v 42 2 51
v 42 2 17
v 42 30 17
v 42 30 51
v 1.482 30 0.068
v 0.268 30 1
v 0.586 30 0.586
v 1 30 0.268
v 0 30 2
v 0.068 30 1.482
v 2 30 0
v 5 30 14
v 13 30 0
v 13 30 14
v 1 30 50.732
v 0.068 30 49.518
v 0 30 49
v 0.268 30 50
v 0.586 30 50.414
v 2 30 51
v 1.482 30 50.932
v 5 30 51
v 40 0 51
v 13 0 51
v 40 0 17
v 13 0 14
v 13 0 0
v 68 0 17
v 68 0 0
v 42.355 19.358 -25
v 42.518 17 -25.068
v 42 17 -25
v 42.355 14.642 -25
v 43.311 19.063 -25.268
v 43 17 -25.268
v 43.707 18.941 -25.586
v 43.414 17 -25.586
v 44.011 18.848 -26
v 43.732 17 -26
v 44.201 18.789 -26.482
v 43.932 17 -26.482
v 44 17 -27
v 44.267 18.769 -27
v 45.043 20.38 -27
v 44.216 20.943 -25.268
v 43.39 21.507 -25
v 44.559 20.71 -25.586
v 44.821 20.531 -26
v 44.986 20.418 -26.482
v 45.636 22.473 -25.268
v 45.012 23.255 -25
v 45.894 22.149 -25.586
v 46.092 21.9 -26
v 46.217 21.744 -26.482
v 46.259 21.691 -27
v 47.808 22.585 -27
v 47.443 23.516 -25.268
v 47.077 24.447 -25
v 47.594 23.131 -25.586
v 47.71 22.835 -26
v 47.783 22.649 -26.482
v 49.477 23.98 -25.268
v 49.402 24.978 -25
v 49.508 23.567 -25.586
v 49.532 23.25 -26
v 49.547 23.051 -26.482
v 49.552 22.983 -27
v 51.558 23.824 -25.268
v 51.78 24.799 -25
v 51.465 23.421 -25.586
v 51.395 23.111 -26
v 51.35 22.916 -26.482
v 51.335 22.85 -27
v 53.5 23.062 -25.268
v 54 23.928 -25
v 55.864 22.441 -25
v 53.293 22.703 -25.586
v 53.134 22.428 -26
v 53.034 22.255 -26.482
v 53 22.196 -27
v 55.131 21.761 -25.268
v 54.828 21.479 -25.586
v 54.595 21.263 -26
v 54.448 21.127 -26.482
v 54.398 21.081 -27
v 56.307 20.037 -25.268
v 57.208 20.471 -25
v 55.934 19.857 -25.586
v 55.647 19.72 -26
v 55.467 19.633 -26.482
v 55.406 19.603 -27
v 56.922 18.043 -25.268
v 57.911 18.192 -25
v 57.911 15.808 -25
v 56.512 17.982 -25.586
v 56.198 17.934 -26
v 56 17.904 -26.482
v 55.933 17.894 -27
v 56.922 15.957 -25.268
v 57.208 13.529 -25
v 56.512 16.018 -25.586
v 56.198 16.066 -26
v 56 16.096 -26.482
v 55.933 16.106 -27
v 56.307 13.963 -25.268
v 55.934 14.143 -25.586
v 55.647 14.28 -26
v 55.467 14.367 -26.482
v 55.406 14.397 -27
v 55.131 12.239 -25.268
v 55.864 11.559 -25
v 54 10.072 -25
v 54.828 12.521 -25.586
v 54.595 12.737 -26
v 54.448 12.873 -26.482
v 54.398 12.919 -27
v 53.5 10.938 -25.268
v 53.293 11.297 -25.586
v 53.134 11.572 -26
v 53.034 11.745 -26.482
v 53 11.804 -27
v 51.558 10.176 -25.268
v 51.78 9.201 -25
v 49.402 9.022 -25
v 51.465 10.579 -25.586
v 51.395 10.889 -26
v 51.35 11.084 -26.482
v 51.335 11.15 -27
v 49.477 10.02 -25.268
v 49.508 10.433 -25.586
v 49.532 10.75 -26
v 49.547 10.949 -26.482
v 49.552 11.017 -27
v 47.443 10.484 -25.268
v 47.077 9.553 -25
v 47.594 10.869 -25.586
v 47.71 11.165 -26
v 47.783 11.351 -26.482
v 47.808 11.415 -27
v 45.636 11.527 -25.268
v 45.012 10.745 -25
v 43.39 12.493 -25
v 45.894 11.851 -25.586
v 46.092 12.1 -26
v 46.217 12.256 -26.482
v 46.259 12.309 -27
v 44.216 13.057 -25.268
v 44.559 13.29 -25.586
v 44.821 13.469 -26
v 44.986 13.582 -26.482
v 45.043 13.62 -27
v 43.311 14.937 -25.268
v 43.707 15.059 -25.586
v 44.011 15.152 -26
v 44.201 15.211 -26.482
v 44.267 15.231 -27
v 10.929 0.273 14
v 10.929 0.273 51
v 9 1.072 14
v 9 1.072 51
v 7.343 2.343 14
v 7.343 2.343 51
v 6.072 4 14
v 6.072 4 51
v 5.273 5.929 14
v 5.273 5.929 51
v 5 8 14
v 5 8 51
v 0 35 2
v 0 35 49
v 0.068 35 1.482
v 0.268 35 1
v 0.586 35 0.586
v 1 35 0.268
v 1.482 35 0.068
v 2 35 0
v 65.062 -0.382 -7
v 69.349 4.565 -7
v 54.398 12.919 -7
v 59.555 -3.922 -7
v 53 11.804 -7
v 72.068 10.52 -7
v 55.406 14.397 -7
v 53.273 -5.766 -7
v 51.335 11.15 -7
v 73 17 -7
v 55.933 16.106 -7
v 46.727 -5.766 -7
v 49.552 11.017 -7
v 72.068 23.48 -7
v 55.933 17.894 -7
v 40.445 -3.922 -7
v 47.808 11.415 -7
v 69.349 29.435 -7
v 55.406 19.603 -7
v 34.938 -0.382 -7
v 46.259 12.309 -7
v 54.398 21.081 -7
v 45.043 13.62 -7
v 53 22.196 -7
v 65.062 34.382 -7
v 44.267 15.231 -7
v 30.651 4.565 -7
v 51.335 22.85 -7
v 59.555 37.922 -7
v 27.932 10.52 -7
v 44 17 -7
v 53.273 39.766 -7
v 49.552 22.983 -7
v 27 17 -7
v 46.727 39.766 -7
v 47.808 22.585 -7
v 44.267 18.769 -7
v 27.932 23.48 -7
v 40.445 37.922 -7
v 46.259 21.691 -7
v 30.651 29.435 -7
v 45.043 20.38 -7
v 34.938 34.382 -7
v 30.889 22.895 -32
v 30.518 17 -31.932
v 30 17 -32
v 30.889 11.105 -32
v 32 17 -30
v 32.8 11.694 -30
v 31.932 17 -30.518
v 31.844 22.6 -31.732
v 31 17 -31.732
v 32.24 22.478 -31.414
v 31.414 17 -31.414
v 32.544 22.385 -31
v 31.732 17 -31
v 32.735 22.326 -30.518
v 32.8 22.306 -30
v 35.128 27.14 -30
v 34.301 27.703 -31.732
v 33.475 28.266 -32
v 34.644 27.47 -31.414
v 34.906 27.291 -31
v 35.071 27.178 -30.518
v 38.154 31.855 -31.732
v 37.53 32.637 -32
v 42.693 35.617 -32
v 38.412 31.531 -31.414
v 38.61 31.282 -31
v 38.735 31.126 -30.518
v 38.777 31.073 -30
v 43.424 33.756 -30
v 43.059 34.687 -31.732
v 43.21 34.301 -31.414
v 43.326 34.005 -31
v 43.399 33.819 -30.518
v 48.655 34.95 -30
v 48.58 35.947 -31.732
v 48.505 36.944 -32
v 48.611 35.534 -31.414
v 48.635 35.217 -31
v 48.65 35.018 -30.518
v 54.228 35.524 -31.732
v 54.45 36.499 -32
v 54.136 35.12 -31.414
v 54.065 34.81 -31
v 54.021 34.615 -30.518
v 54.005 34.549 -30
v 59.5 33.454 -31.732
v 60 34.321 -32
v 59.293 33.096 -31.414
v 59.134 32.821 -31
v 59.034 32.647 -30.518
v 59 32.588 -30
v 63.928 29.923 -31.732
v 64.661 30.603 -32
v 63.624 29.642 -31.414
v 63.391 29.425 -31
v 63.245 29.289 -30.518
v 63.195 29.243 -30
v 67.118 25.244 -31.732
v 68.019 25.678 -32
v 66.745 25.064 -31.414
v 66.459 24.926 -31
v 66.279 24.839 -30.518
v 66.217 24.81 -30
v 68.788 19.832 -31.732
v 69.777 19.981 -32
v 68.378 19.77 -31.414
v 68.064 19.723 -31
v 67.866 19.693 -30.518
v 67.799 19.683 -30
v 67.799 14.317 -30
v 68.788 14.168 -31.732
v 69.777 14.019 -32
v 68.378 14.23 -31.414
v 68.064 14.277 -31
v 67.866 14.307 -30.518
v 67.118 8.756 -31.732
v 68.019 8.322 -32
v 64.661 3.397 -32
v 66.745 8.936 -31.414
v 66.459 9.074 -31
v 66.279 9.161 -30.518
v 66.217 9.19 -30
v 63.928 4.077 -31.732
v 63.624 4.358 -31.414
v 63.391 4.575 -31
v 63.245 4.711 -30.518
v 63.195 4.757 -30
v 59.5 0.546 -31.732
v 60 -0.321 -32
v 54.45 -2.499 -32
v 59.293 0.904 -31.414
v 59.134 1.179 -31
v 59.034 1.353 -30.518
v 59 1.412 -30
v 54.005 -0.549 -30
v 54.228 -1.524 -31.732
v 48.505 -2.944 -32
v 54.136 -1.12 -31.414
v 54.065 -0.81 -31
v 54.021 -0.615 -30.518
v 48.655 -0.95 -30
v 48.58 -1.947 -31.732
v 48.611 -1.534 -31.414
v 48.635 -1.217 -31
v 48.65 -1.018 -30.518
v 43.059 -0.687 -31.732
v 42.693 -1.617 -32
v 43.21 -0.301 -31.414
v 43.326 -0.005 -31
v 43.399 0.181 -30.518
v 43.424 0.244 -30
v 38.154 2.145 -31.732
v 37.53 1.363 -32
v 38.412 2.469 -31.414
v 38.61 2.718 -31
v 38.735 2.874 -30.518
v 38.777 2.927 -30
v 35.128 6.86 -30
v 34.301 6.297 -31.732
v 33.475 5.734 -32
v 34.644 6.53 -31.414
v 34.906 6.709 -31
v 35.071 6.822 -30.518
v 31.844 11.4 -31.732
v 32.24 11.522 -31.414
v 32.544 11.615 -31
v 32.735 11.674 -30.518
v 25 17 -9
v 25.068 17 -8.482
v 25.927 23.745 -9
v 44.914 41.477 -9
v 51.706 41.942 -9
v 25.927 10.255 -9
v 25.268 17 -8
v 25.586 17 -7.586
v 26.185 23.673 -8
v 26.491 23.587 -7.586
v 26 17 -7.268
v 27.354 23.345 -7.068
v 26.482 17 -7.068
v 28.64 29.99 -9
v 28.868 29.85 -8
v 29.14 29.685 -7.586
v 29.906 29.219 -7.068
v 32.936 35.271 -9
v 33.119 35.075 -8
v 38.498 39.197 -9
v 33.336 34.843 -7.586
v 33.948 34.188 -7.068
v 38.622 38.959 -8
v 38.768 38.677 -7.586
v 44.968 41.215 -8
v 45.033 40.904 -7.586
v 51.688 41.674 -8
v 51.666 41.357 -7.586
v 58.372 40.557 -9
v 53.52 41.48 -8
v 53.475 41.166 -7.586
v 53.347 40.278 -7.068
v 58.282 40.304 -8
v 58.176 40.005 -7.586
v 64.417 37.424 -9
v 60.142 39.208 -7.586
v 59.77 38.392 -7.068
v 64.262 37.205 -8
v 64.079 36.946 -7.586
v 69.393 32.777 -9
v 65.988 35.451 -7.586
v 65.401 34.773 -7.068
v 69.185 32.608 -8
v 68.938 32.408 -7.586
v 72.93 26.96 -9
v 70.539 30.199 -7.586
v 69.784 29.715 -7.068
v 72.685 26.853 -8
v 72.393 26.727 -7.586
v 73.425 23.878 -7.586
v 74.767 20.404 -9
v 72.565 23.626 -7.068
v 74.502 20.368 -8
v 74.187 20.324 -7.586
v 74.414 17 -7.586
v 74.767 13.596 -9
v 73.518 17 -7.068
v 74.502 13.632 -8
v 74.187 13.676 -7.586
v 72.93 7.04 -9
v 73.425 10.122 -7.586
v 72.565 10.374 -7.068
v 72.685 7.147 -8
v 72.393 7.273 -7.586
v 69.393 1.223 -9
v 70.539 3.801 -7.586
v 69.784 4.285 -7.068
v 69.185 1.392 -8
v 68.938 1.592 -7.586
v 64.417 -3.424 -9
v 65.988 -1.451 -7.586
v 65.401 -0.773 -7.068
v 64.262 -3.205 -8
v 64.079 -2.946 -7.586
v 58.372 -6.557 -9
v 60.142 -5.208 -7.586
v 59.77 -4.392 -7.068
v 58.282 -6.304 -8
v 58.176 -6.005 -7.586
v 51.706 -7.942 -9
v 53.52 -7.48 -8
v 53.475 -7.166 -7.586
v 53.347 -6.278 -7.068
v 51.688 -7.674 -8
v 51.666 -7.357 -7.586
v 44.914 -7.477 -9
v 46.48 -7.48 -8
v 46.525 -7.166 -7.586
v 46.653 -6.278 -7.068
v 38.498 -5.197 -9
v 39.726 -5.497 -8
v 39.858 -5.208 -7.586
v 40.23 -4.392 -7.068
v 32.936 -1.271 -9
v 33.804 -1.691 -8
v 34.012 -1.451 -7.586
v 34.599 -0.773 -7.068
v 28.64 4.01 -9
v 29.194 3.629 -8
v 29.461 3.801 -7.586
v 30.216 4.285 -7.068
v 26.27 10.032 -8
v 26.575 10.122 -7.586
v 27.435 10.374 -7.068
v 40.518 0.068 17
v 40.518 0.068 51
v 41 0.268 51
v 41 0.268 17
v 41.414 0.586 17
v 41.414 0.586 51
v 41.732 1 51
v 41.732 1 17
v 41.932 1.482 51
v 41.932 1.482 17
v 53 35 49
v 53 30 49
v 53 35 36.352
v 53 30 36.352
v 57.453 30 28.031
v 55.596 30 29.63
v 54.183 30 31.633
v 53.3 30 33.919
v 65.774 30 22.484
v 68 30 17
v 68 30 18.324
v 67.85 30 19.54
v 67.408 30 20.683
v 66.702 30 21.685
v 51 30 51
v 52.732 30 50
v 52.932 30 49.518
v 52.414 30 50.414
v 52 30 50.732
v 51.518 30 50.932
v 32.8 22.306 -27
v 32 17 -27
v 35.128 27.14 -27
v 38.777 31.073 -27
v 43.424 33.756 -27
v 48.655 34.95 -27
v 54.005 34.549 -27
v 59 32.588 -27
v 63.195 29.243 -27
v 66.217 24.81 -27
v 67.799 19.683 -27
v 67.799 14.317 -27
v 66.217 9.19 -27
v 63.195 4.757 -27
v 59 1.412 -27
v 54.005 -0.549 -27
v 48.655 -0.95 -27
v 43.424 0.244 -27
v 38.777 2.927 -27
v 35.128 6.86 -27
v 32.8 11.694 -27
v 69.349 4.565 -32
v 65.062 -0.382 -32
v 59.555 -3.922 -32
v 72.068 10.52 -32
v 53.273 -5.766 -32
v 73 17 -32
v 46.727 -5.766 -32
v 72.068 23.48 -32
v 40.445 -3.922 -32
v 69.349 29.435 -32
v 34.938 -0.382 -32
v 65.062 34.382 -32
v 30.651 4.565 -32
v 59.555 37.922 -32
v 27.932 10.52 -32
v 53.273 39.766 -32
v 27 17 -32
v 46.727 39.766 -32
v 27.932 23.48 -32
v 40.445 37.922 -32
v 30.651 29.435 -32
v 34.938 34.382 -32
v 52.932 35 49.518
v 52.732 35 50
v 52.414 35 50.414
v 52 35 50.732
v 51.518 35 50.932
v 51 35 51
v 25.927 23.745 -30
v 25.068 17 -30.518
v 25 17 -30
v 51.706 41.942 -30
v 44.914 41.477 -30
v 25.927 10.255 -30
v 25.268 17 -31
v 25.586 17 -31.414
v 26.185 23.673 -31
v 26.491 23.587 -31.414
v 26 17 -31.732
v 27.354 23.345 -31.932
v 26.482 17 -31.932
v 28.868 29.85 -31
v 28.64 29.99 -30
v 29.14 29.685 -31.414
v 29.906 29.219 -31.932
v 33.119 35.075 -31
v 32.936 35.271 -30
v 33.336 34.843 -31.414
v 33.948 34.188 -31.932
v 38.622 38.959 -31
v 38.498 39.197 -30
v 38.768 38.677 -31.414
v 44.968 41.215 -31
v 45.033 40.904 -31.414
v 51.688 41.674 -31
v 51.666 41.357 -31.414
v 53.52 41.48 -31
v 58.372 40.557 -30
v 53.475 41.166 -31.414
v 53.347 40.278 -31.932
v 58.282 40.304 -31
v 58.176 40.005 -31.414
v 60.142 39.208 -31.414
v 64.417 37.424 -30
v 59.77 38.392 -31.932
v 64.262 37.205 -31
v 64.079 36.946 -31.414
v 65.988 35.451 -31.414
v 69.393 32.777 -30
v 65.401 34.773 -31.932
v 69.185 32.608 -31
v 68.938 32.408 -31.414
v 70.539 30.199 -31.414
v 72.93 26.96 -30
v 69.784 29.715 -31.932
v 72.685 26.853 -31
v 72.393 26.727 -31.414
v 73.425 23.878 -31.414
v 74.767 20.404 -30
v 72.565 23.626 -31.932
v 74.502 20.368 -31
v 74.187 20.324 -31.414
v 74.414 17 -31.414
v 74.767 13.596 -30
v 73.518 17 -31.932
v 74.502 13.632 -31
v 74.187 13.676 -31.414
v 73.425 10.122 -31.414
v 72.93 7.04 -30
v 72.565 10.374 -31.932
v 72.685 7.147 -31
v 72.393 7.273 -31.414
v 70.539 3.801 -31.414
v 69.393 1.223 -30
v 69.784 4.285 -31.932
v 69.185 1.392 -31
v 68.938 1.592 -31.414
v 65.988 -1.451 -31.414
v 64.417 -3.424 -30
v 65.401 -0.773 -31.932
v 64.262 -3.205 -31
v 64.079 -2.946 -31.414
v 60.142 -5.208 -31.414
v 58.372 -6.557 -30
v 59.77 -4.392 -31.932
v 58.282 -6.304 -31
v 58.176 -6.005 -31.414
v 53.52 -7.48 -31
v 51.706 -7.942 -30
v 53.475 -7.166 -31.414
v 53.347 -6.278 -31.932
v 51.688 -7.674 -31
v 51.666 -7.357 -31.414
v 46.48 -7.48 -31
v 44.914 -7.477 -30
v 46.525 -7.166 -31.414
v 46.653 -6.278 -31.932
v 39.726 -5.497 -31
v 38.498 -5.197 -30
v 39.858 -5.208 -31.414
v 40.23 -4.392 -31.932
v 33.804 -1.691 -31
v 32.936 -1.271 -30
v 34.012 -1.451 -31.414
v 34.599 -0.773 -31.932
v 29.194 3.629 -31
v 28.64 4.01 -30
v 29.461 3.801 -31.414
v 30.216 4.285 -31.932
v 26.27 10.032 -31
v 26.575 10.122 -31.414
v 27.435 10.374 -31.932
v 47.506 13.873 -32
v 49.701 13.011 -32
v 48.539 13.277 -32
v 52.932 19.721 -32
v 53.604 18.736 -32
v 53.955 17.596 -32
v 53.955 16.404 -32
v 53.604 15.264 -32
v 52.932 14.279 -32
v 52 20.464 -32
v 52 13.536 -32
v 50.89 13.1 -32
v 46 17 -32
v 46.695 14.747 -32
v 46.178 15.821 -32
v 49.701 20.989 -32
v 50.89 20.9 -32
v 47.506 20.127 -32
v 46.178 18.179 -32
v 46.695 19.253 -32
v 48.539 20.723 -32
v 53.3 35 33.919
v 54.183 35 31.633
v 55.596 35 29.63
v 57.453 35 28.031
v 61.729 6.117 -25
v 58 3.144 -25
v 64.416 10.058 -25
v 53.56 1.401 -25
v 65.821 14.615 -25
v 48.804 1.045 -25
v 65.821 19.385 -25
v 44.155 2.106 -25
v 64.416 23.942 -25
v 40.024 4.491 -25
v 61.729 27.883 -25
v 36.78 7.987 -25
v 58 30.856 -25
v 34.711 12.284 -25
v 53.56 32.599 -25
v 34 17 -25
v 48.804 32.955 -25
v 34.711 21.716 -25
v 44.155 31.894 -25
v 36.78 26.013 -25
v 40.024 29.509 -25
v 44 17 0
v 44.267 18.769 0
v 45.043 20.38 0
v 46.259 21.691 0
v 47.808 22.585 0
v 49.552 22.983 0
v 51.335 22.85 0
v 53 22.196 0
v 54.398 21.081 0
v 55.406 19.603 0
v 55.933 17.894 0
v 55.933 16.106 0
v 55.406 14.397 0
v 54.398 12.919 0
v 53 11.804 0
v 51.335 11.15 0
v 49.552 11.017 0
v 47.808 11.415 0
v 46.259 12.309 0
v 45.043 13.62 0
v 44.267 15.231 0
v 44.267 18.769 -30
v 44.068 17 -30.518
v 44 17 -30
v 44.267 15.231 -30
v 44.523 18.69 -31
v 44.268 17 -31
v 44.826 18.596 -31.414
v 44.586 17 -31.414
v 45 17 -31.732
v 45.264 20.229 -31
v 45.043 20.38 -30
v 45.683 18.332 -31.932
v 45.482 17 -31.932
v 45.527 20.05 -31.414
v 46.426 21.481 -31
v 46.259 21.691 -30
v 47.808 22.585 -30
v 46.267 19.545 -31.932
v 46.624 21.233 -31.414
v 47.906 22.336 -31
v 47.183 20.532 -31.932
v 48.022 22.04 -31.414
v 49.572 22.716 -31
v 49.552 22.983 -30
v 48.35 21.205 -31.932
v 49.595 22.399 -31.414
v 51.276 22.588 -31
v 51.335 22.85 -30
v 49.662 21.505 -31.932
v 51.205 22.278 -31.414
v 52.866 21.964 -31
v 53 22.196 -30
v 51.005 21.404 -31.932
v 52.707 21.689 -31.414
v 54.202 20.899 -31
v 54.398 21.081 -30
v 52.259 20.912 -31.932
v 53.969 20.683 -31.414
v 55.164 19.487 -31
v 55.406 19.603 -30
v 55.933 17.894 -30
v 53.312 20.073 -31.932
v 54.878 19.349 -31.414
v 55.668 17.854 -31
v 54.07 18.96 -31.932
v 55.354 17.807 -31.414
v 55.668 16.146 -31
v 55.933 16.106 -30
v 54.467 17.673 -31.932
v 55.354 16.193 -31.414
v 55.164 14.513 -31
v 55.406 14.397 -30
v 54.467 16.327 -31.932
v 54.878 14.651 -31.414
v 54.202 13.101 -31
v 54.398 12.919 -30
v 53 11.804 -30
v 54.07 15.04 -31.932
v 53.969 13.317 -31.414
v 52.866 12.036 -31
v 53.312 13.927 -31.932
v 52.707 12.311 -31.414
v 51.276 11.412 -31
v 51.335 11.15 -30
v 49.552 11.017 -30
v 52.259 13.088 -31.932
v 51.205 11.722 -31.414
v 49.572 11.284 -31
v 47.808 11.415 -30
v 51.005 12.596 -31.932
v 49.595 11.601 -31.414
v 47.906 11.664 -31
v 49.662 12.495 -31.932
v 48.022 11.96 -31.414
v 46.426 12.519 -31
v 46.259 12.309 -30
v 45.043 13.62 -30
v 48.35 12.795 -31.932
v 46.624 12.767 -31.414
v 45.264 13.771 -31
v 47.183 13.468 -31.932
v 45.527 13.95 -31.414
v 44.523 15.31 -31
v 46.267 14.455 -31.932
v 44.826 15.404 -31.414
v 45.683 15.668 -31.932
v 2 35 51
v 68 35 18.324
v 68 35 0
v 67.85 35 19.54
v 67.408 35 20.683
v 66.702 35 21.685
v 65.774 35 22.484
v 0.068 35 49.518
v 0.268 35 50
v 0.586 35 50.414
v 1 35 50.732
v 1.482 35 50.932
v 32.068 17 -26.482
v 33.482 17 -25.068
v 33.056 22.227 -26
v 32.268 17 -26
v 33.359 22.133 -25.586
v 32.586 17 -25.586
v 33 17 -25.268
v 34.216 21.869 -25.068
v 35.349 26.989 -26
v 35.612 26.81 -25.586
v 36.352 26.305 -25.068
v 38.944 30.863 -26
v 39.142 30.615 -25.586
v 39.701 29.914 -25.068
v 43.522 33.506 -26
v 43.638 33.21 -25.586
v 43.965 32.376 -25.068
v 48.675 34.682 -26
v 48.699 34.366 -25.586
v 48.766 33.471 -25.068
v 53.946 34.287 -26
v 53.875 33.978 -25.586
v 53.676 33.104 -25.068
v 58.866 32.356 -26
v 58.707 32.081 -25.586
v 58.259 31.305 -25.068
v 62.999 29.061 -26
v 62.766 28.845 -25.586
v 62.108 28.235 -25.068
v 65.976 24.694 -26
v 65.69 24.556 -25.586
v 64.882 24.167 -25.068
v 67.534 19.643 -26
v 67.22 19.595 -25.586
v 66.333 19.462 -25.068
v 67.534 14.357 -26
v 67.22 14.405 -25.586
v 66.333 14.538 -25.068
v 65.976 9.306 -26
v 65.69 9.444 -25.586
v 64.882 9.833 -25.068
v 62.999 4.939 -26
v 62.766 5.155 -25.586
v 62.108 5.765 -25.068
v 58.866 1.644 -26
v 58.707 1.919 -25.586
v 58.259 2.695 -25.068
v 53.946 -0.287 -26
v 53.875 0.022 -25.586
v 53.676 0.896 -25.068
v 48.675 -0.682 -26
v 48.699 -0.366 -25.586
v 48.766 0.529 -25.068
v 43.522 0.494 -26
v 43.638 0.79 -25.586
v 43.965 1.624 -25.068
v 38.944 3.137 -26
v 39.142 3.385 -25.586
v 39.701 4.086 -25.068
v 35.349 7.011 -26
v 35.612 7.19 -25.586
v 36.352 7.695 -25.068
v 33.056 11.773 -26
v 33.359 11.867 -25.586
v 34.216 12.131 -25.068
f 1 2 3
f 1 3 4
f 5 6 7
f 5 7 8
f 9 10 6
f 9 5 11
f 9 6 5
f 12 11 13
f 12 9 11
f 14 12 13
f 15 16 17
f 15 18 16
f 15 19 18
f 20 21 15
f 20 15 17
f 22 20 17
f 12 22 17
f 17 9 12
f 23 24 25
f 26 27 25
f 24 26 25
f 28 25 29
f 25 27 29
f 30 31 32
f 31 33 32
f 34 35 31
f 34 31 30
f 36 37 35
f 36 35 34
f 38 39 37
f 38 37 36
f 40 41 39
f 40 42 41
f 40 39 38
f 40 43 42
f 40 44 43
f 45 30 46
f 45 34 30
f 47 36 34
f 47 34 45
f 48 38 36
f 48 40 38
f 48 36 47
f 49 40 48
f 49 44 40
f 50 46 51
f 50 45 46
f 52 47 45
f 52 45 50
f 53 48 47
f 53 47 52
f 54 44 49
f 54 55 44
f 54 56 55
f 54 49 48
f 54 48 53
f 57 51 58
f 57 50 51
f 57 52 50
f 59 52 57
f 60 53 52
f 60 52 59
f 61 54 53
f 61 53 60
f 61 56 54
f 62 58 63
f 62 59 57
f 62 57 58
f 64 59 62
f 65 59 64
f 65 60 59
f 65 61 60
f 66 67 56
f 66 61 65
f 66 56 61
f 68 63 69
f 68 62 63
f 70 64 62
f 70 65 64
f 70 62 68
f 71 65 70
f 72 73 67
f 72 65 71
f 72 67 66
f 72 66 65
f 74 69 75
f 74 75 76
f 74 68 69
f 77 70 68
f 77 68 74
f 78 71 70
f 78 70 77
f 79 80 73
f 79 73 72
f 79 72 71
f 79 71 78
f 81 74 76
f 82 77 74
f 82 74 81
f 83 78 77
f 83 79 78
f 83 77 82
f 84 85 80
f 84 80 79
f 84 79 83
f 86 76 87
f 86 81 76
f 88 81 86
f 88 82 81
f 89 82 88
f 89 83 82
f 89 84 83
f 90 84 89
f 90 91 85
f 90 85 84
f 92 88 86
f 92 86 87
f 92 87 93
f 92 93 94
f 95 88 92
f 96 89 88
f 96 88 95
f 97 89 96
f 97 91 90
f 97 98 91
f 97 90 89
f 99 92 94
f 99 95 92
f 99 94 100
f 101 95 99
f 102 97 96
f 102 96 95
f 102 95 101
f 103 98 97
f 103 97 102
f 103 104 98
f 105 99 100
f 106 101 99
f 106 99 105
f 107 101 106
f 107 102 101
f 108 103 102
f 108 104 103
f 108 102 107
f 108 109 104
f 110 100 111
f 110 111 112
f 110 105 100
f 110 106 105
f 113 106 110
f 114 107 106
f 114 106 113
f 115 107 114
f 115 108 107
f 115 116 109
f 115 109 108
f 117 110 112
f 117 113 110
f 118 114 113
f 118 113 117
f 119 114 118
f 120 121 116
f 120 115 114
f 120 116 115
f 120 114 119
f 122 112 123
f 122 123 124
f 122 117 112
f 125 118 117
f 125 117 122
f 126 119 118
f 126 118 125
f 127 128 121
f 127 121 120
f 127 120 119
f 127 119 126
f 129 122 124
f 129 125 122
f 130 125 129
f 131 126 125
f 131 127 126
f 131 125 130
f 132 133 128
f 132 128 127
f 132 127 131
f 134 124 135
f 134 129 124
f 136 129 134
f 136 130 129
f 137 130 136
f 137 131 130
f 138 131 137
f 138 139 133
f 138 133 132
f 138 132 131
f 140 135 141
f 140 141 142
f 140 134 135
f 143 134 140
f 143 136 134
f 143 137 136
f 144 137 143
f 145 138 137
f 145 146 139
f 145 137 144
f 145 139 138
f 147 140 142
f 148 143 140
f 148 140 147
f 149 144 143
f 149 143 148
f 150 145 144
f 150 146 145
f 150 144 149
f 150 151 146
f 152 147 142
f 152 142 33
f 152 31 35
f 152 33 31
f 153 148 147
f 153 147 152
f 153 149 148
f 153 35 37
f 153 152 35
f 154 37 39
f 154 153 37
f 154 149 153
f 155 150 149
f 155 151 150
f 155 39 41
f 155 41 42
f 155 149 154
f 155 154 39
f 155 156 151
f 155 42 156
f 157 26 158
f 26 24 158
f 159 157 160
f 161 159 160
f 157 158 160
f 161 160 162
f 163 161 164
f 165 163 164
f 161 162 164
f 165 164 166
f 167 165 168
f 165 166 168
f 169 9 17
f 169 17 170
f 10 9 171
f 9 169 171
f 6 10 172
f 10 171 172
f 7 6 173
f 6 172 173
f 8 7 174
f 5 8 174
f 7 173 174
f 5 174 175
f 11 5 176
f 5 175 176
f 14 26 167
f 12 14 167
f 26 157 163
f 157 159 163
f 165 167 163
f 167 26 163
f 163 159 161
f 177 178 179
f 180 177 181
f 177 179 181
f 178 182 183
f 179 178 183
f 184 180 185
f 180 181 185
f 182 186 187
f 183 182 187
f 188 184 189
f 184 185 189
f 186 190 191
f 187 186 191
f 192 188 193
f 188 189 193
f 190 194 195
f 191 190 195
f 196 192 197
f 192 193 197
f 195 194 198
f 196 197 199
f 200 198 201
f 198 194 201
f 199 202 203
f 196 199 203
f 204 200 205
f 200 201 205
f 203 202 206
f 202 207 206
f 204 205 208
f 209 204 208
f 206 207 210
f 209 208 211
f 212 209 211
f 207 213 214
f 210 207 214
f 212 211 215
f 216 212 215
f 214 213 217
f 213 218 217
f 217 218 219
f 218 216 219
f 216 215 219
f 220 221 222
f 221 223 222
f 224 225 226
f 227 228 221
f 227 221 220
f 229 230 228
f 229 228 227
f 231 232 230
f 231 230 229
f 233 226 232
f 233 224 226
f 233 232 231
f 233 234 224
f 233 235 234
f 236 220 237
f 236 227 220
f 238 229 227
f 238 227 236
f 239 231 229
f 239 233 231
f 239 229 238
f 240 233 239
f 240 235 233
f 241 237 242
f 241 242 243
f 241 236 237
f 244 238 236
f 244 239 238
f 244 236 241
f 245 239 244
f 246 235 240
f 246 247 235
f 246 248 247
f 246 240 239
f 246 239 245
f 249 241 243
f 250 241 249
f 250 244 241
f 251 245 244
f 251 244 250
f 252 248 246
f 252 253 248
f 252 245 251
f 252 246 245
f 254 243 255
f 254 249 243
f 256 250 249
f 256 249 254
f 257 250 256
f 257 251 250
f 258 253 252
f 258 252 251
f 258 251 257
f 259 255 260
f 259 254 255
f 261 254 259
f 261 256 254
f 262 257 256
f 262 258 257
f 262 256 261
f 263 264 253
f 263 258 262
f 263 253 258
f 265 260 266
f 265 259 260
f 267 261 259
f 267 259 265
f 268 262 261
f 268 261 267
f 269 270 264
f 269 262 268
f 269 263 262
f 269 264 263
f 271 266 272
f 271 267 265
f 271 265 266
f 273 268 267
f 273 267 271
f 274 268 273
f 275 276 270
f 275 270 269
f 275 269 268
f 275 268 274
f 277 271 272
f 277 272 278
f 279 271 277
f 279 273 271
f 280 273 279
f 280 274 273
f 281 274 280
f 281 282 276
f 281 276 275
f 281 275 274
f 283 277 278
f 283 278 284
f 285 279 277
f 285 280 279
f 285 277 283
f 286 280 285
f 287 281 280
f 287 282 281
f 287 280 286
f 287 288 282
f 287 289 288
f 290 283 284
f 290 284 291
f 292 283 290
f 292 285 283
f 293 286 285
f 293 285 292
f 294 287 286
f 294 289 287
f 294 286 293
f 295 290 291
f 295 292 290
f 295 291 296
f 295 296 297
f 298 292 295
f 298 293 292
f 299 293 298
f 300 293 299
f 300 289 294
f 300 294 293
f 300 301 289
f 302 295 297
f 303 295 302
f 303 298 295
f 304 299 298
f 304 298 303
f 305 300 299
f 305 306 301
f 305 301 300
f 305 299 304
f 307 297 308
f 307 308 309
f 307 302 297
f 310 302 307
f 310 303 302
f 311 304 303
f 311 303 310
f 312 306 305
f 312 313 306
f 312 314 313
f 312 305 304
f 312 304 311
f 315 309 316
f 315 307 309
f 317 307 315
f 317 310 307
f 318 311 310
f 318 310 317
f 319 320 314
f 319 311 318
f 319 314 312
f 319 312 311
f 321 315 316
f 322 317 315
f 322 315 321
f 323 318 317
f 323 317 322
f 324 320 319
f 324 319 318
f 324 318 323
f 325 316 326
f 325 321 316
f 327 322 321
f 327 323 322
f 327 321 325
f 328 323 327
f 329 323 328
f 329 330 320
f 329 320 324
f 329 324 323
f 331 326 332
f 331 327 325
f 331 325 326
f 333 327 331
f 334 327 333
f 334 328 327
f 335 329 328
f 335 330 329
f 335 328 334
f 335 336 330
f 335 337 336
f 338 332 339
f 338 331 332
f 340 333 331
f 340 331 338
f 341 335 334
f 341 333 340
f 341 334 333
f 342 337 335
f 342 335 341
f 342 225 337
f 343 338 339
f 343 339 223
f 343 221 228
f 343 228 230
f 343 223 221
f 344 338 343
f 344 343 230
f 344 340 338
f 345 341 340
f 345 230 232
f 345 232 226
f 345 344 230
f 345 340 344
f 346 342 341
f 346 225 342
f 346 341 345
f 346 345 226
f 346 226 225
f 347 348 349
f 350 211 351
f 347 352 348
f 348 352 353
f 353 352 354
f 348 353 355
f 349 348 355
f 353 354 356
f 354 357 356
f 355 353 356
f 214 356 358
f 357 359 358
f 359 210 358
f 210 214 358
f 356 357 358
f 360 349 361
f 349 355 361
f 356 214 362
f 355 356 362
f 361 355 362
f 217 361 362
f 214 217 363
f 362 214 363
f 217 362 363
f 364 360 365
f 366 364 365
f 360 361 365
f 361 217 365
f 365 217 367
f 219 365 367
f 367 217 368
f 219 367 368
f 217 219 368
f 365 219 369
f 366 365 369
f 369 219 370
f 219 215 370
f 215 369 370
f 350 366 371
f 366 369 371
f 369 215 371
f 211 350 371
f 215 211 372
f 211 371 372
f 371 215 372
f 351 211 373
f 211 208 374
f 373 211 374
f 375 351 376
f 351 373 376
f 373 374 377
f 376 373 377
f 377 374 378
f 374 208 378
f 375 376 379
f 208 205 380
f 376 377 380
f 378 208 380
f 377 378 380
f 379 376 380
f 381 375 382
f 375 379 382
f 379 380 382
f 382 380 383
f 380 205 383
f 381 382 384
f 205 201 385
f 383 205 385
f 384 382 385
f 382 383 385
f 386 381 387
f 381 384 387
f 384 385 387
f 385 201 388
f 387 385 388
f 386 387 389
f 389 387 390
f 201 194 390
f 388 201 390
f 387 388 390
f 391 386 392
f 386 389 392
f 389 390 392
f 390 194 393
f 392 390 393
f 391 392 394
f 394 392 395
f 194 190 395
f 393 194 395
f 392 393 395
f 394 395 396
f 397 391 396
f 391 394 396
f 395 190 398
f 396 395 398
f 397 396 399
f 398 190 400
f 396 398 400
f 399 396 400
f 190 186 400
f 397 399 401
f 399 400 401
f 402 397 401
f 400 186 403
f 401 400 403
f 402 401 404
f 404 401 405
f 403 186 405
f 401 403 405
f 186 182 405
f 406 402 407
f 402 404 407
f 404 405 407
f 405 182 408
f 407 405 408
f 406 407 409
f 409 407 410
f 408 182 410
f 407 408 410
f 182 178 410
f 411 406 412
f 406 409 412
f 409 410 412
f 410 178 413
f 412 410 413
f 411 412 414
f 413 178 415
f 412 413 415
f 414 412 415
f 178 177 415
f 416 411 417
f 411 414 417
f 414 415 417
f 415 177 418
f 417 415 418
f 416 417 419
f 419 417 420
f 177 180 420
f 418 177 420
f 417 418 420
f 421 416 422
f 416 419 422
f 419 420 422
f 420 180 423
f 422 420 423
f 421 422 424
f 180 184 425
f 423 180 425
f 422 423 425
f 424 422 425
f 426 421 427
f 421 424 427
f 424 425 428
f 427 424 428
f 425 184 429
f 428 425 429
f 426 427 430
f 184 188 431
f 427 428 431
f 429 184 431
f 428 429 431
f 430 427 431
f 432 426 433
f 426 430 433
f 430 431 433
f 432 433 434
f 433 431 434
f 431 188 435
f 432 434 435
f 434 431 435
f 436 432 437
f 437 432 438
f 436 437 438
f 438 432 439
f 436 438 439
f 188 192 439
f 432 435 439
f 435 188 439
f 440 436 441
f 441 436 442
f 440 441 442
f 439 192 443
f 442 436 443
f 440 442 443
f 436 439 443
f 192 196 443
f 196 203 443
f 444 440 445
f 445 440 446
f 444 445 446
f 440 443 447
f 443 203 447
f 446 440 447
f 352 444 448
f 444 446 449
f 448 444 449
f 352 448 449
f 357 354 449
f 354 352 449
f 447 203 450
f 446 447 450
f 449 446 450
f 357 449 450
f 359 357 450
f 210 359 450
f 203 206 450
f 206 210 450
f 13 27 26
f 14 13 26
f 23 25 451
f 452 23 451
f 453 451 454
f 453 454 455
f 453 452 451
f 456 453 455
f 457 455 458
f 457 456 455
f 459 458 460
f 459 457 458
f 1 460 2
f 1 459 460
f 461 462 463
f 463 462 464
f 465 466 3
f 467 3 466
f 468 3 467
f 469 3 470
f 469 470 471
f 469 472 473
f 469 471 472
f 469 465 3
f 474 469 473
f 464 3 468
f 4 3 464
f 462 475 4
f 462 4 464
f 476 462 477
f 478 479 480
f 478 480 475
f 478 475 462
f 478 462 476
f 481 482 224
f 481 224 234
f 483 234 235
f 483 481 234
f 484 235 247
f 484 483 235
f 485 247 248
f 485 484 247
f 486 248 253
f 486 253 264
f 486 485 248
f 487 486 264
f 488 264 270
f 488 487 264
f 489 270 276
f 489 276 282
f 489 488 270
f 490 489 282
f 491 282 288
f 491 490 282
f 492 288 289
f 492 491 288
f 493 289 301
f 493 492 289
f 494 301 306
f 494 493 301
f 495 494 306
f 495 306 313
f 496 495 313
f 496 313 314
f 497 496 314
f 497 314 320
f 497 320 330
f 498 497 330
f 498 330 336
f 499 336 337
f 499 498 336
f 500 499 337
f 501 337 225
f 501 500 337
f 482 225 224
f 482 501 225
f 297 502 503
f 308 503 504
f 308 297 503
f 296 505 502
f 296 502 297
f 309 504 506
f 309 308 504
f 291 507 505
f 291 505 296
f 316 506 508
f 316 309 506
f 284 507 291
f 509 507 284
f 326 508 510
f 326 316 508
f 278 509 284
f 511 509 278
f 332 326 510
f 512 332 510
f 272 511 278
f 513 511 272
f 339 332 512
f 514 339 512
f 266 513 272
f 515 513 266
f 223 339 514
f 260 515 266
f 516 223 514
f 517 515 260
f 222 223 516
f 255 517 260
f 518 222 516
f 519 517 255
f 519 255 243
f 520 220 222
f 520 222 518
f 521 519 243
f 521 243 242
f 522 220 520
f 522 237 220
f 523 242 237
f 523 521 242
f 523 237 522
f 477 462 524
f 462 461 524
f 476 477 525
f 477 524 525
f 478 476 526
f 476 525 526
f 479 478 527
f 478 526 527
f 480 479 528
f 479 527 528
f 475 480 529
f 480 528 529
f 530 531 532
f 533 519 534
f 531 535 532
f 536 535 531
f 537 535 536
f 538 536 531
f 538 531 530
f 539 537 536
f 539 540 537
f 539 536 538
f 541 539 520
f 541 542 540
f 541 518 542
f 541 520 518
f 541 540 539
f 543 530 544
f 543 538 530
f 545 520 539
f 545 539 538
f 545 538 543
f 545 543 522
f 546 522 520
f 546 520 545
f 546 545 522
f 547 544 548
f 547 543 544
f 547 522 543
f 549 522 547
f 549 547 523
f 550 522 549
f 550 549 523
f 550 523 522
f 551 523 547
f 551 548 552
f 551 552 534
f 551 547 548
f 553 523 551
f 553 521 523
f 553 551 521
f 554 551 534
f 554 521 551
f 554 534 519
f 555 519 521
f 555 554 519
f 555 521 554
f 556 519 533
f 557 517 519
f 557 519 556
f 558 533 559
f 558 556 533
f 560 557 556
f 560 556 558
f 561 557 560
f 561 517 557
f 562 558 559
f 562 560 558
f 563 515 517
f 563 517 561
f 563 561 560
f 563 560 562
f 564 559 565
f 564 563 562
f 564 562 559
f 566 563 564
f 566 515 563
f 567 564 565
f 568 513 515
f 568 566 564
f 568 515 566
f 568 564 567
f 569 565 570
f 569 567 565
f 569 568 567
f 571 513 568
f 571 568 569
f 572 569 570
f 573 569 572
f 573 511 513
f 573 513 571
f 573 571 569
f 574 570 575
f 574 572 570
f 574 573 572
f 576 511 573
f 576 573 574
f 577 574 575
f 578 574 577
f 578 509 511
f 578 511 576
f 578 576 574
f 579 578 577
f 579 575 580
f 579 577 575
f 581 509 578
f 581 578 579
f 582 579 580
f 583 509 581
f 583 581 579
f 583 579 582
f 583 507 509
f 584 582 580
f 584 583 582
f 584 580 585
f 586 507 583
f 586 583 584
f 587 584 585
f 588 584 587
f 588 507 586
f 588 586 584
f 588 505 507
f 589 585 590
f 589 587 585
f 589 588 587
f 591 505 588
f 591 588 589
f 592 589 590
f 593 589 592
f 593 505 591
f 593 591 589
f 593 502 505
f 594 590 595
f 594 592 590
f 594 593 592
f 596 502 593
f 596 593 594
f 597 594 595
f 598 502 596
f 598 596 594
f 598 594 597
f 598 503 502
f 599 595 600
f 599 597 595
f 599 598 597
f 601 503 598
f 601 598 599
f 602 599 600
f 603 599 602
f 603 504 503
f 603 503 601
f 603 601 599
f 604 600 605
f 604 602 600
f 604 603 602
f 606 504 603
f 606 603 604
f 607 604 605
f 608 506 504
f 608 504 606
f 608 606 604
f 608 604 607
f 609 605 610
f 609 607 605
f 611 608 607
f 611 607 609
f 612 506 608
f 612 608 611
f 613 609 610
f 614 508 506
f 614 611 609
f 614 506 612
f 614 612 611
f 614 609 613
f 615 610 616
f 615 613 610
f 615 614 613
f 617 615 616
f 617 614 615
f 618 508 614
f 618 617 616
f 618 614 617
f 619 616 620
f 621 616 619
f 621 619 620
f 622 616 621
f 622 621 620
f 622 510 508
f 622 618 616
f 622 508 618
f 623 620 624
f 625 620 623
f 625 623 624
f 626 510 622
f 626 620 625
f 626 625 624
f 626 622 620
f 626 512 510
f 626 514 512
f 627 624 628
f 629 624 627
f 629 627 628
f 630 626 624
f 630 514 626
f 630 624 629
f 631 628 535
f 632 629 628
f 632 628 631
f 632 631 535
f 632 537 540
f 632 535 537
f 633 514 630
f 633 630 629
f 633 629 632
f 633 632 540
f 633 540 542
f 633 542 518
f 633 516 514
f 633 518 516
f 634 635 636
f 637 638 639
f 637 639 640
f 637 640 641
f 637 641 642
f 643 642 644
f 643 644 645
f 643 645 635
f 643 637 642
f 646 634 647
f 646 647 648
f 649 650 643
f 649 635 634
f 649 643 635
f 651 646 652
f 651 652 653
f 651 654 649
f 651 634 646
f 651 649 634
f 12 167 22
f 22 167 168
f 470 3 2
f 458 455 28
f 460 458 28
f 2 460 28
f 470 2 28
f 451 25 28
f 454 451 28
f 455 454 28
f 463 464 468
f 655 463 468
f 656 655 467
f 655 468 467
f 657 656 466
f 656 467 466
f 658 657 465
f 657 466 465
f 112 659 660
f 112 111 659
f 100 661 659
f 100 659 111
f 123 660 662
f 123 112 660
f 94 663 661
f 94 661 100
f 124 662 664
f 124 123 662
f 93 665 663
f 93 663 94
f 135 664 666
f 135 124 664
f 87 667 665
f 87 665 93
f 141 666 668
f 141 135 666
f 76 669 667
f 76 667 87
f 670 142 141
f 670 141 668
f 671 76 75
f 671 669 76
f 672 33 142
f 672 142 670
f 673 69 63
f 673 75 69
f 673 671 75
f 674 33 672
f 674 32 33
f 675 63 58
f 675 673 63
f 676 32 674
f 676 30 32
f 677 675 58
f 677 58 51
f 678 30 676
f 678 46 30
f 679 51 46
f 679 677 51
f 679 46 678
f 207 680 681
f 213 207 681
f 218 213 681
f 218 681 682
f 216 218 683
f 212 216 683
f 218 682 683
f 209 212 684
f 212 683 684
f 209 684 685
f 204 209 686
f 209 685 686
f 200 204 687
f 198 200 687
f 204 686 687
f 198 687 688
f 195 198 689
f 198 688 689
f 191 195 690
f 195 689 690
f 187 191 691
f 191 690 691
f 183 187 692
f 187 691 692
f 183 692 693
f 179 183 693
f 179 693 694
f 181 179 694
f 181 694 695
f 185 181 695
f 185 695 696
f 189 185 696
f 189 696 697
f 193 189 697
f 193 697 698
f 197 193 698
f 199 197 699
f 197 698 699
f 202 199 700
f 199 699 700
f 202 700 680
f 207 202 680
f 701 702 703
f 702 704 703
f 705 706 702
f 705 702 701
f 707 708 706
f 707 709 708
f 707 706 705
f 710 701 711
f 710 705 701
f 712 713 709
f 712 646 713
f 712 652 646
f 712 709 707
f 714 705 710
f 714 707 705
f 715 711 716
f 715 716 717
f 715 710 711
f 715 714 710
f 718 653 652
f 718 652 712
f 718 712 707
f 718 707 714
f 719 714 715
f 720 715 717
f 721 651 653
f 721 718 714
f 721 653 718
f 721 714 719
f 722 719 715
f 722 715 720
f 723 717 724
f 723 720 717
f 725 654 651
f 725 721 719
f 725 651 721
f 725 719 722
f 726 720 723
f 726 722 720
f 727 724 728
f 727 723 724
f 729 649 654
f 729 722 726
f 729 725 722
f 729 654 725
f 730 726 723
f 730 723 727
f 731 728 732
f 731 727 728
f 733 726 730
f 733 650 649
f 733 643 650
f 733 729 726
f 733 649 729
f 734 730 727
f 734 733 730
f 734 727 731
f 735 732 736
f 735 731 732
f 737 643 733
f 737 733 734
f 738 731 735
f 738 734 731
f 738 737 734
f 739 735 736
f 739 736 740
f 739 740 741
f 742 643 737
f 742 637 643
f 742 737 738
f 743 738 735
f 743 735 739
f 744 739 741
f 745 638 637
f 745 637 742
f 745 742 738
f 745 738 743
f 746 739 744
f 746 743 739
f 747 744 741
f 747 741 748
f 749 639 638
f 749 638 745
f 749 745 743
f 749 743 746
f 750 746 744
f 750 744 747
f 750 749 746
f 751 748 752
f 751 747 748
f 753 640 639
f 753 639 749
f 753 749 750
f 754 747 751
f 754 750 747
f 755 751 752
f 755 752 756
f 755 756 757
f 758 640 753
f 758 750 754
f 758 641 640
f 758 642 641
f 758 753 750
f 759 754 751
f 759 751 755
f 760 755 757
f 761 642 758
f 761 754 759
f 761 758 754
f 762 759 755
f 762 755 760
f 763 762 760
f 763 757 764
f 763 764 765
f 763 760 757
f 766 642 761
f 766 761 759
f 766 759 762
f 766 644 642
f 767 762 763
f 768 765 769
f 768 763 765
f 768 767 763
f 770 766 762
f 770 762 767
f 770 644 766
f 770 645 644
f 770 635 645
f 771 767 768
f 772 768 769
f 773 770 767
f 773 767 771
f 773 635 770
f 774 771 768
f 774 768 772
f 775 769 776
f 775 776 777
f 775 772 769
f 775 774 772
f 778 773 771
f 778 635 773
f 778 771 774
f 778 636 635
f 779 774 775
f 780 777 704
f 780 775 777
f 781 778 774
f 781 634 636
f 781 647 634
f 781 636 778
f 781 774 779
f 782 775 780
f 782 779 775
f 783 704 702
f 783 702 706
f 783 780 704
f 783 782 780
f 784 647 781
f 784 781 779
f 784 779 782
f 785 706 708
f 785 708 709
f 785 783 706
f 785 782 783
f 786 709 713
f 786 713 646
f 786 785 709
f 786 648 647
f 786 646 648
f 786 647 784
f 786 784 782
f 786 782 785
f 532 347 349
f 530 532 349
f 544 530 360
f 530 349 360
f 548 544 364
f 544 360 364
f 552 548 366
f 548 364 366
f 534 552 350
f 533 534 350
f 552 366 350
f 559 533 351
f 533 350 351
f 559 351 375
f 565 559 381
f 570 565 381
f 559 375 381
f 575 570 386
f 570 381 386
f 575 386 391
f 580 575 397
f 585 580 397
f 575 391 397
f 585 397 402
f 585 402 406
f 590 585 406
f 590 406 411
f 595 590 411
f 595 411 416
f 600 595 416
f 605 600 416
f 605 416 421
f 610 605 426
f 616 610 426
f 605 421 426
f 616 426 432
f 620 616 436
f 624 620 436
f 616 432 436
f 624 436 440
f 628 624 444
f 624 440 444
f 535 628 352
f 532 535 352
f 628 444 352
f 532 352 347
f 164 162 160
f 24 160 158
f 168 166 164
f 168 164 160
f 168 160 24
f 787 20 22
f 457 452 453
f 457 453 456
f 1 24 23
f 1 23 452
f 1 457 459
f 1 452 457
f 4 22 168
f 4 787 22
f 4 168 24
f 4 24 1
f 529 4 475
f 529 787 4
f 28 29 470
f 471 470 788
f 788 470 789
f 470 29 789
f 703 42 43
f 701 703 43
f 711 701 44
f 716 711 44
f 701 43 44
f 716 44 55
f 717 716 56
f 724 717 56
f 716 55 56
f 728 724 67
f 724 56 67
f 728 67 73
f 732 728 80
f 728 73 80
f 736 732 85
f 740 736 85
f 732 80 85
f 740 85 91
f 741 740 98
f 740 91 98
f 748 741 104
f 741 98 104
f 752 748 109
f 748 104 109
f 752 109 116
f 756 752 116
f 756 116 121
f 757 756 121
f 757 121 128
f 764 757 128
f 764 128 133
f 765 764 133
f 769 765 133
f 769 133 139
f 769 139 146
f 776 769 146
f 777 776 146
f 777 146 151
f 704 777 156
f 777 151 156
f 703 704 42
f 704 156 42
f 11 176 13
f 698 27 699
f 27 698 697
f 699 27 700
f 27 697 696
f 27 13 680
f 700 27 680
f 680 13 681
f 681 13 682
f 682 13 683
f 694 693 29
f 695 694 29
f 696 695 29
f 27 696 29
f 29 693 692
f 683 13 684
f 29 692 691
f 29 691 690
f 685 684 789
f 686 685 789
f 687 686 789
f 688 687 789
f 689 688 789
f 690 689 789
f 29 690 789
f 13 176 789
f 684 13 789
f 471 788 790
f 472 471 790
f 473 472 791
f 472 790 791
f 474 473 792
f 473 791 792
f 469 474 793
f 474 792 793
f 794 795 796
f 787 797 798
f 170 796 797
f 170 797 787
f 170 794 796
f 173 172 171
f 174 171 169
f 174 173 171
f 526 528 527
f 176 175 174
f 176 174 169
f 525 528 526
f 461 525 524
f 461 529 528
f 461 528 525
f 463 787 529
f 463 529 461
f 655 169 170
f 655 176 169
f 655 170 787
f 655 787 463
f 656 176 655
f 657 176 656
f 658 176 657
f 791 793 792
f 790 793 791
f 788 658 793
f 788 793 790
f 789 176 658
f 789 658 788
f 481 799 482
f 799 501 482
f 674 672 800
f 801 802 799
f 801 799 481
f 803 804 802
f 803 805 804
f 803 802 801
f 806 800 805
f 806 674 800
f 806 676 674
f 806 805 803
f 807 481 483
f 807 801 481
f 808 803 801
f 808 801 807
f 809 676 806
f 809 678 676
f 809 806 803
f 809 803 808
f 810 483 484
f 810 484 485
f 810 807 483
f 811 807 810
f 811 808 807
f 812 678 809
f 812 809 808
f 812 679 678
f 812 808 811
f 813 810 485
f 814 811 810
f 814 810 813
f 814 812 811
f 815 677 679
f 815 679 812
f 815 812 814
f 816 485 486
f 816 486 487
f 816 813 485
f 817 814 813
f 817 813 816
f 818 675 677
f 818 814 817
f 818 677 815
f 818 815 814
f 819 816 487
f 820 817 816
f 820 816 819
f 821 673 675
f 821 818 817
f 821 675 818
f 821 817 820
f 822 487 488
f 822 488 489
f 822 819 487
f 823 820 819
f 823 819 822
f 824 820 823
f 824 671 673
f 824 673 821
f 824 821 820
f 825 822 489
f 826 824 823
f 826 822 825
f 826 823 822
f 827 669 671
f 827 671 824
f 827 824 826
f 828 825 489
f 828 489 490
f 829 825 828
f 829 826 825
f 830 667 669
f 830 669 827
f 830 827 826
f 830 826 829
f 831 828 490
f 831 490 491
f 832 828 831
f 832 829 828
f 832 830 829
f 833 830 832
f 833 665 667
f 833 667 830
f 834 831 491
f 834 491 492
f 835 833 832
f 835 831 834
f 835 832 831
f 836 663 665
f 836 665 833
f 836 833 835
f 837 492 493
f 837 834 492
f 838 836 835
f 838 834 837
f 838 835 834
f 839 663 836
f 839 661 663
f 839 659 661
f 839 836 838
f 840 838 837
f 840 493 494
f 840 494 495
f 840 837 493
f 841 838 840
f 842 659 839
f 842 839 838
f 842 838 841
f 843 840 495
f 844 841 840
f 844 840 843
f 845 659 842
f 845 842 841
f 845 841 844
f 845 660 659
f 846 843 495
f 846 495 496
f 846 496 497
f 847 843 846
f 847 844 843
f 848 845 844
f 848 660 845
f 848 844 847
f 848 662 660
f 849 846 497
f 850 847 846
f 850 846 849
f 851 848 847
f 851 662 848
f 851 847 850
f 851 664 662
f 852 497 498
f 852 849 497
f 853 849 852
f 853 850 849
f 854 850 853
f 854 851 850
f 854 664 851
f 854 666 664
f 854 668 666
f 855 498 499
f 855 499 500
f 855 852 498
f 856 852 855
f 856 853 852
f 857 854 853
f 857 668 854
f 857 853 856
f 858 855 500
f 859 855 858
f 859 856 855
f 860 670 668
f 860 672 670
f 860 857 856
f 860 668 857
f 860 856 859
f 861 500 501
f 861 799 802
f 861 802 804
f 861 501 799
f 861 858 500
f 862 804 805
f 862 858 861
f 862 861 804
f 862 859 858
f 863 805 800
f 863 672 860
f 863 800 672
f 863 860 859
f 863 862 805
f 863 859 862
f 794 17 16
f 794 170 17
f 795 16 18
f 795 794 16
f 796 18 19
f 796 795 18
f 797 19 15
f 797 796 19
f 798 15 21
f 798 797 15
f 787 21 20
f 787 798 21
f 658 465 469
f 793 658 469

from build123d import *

# Parameters (mm, degrees)
ESQUISSE1_W             = 68
ESQUISSE1_H             = 35
BOSS_EXTRU_1_DEPTH      = 51
ESQUISSE2_R             = 6
BOSS_EXTRU_2_DEPTH      = 7
ESQUISSE3_R             = 25
BOSS_EXTRU_3_DEPTH      = 25
ENL_V_START             = -7
ESQUISSE4_R             = 18
ESQUISSE4_R_2           = 6
ENL_V_MAT_EXTRU_1_DEPTH = 7
CONG_1_R                = 2
ENL_V_MAT_EXTRU_2_DEPTH = 100.949987536
CONG_2_R                = 5
ESQUISSE7_W             = 26
ESQUISSE7_H             = 34
ENL_V_MAT_EXTRU_3_DEPTH = 30
ENL_V_MAT_EXTRU_4_DEPTH = 30
CONG_3_R                = 8
CONG_4_R                = 2
CONG_5_R                = 2


with BuildPart() as part:
    # Esquisse1 → Boss.-Extru.1 (new body)
    with BuildSketch(Plane.XY):
        with Locations((34, 17.5)):
            Rectangle(ESQUISSE1_W, ESQUISSE1_H)
    extrude(amount=BOSS_EXTRU_1_DEPTH)

    # Esquisse2 → Boss.-Extru.2 (add)
    with BuildSketch(Plane(origin=(0, 0, 0), x_dir=(-1, 0, 0), z_dir=(0, 0, -1))):
        with Locations((-50, 17)):
            Circle(ESQUISSE2_R)
    extrude(amount=BOSS_EXTRU_2_DEPTH)

    # Esquisse3 → Boss.-Extru.3 (add)
    with BuildSketch(Plane(origin=(0, 0, -7), x_dir=(-1, 0, 0), z_dir=(0, 0, -1))):
        with Locations((-50, 17)):
            Circle(ESQUISSE3_R)
    extrude(amount=BOSS_EXTRU_3_DEPTH)

    # Esquisse4 → Enlèv. mat.-Extru.1 (cut)
    with BuildSketch(Plane(origin=(0, 0, -32), x_dir=(-1, 0, 0), z_dir=(0, 0, -1)).offset(ENL_V_START)):
        with Locations((-50, 17)):
            Circle(ESQUISSE4_R)
        with Locations((-50, 17)):
            Circle(ESQUISSE4_R_2, mode=Mode.SUBTRACT)
    extrude(amount=ENL_V_MAT_EXTRU_1_DEPTH, mode=Mode.SUBTRACT)

    # Congé1
    cong_1_edges = [part.edges().sort_by_distance(p)[0] for p in [
        (75, 17, -7),
        (75, 17, -32),
        (68, 17, -25),
        (56, 17, -25),
        (68, 17, -32),
        (56, 17, -32),
    ]]
    fillet(cong_1_edges, radius=CONG_1_R)

    # Esquisse6 → Enlèv. mat.-Extru.2 (cut, through all)
    with BuildSketch(Plane(origin=(0, 0, 0), x_dir=(-1, 0, 0), z_dir=(0, -1, 0))):
        with BuildLine():
            Line((-53, -51), (-53, -36.351837585))
            ThreePointArc((-53, -36.351837585), (-54.183254012, -31.63325833), (-57.452998038, -28.031334642))
            Line((-57.452998038, -28.031334642), (-68, -21))
            Line((-68, -21), (-68, -51))
            Line((-68, -51), (-53, -51))
        make_face()
    extrude(amount=-ENL_V_MAT_EXTRU_2_DEPTH, mode=Mode.SUBTRACT)

    # Congé2
    cong_2_edges = [part.edges().sort_by_distance(p)[0] for p in [
        (68, 17.5, 21),
    ]]
    fillet(cong_2_edges, radius=CONG_2_R)

    # Esquisse7 → Enlèv. mat.-Extru.3 (cut)
    with BuildSketch(Plane.XZ):
        with Locations((55, 34)):
            Rectangle(ESQUISSE7_W, ESQUISSE7_H)
    extrude(amount=-ENL_V_MAT_EXTRU_3_DEPTH, mode=Mode.SUBTRACT)

    # Esquisse8 → Enlèv. mat.-Extru.4 (cut)
    with BuildSketch(Plane.XZ):
        Polygon((0, 0), (13, 0), (13, 14), (5, 14), (5, 51), (0, 51), align=None)
    extrude(amount=-ENL_V_MAT_EXTRU_4_DEPTH, mode=Mode.SUBTRACT)

    # Congé3
    cong_3_edges = [part.edges().sort_by_distance(p)[0] for p in [
        (5, 0, 32.5),
    ]]
    fillet(cong_3_edges, radius=CONG_3_R)

    # Congé4
    cong_4_edges = [part.edges().sort_by_distance(p)[0] for p in [
        (42, 0, 34),
    ]]
    fillet(cong_4_edges, radius=CONG_4_R)

    # Congé5
    cong_5_edges = [part.edges().sort_by_distance(p)[0] for p in [
        (0, 32.5, 51),
        (0, 32.5, 0),
        (53, 32.5, 51),
    ]]
    fillet(cong_5_edges, radius=CONG_5_R)


solid = part.part
